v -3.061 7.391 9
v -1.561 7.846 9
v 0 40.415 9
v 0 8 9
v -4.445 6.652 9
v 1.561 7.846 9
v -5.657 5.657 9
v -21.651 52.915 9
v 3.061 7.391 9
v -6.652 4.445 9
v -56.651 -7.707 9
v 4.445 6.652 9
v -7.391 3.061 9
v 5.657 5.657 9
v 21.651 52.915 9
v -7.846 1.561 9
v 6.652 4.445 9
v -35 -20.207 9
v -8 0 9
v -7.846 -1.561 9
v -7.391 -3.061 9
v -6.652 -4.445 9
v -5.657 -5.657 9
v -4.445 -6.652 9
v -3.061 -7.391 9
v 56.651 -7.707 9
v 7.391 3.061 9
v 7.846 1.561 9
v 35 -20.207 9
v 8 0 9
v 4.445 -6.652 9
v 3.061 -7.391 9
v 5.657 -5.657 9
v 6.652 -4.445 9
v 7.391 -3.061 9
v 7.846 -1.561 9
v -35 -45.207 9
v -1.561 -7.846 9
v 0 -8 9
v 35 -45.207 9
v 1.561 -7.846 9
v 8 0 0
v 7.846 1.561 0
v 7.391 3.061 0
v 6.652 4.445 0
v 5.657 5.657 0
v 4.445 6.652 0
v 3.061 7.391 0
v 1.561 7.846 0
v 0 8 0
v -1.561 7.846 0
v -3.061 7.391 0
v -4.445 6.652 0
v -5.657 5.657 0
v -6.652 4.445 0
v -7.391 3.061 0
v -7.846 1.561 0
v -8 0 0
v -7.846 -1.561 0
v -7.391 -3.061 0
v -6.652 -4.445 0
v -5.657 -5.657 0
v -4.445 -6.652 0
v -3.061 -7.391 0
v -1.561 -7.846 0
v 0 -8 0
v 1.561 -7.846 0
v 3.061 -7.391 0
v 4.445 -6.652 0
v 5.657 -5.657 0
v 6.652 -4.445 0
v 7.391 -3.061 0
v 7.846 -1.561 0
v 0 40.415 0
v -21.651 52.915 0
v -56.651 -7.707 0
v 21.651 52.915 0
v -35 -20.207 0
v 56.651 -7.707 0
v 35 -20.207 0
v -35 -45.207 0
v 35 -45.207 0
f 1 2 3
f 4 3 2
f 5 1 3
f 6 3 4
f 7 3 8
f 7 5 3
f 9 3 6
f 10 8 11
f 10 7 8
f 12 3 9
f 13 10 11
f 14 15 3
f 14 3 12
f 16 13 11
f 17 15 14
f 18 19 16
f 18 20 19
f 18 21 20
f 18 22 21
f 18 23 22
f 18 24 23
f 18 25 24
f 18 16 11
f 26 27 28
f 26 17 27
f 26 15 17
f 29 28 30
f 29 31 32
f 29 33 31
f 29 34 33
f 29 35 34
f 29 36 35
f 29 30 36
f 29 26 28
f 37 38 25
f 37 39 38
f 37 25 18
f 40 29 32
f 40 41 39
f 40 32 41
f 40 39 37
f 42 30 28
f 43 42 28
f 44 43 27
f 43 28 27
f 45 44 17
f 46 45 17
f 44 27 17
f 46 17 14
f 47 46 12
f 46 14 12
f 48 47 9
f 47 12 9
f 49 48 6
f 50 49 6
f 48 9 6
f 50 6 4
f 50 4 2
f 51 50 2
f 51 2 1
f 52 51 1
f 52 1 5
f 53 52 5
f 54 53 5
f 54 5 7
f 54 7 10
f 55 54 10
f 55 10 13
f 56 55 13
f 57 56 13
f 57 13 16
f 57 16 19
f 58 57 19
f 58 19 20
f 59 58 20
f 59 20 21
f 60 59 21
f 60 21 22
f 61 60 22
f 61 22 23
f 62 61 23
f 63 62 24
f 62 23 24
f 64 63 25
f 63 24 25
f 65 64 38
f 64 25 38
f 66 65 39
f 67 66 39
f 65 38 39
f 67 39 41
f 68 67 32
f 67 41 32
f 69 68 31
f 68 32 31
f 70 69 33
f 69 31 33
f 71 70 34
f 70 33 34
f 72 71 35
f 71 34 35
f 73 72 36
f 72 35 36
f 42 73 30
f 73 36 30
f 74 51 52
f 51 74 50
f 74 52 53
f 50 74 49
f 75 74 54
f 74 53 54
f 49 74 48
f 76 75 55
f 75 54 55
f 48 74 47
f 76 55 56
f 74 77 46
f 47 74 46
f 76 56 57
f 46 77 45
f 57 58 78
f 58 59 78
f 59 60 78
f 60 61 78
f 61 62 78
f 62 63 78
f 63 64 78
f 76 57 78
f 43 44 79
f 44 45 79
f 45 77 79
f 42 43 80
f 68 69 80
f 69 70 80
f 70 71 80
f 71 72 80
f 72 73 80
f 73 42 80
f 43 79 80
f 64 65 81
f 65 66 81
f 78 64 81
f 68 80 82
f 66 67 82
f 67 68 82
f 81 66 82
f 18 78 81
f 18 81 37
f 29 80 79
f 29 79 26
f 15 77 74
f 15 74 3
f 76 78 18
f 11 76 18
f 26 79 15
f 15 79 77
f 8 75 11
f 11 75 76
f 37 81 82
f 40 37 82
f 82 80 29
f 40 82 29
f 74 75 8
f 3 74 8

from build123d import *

# Parameters (mm, degrees)
F1_DEPTH = 9
F2_DEPTH = 25
F3_DEPTH = 25
F4_DEPTH = 25
F5_R     = 8
F6_DEPTH = 25


with BuildPart() as f1:
    # F0 (on Top) → F1 (new body)
    with BuildSketch(Plane.XY):
        Polygon((-35, -20.2072594216), (35, -20.2072594216), (0, 40.4145188433), align=None)
    extrude(amount=F1_DEPTH)

    # F2 (add): a face of the model
    f2_faces = [f1.faces().sort_by_distance(p)[0] for p in [
        (0, -20.2072594216, 4.5),
    ]]
    extrude(f2_faces, amount=F2_DEPTH)

    # F3 (add): a face of the model
    f3_faces = [f1.faces().sort_by_distance(p)[0] for p in [
        (17.5, 10.1036297108, 4.5),
    ]]
    extrude(f3_faces, amount=F3_DEPTH)

    # F4 (add): a face of the model
    f4_faces = [f1.faces().sort_by_distance(p)[0] for p in [
        (-17.5, 10.1036297108, 4.5),
    ]]
    extrude(f4_faces, amount=F4_DEPTH)

    # F5 (on face) → F6 (cut)
    with BuildSketch(Plane.XY.offset(9)):
        Circle(F5_R)
    extrude(amount=-F6_DEPTH, mode=Mode.SUBTRACT)


solid = f1.part
